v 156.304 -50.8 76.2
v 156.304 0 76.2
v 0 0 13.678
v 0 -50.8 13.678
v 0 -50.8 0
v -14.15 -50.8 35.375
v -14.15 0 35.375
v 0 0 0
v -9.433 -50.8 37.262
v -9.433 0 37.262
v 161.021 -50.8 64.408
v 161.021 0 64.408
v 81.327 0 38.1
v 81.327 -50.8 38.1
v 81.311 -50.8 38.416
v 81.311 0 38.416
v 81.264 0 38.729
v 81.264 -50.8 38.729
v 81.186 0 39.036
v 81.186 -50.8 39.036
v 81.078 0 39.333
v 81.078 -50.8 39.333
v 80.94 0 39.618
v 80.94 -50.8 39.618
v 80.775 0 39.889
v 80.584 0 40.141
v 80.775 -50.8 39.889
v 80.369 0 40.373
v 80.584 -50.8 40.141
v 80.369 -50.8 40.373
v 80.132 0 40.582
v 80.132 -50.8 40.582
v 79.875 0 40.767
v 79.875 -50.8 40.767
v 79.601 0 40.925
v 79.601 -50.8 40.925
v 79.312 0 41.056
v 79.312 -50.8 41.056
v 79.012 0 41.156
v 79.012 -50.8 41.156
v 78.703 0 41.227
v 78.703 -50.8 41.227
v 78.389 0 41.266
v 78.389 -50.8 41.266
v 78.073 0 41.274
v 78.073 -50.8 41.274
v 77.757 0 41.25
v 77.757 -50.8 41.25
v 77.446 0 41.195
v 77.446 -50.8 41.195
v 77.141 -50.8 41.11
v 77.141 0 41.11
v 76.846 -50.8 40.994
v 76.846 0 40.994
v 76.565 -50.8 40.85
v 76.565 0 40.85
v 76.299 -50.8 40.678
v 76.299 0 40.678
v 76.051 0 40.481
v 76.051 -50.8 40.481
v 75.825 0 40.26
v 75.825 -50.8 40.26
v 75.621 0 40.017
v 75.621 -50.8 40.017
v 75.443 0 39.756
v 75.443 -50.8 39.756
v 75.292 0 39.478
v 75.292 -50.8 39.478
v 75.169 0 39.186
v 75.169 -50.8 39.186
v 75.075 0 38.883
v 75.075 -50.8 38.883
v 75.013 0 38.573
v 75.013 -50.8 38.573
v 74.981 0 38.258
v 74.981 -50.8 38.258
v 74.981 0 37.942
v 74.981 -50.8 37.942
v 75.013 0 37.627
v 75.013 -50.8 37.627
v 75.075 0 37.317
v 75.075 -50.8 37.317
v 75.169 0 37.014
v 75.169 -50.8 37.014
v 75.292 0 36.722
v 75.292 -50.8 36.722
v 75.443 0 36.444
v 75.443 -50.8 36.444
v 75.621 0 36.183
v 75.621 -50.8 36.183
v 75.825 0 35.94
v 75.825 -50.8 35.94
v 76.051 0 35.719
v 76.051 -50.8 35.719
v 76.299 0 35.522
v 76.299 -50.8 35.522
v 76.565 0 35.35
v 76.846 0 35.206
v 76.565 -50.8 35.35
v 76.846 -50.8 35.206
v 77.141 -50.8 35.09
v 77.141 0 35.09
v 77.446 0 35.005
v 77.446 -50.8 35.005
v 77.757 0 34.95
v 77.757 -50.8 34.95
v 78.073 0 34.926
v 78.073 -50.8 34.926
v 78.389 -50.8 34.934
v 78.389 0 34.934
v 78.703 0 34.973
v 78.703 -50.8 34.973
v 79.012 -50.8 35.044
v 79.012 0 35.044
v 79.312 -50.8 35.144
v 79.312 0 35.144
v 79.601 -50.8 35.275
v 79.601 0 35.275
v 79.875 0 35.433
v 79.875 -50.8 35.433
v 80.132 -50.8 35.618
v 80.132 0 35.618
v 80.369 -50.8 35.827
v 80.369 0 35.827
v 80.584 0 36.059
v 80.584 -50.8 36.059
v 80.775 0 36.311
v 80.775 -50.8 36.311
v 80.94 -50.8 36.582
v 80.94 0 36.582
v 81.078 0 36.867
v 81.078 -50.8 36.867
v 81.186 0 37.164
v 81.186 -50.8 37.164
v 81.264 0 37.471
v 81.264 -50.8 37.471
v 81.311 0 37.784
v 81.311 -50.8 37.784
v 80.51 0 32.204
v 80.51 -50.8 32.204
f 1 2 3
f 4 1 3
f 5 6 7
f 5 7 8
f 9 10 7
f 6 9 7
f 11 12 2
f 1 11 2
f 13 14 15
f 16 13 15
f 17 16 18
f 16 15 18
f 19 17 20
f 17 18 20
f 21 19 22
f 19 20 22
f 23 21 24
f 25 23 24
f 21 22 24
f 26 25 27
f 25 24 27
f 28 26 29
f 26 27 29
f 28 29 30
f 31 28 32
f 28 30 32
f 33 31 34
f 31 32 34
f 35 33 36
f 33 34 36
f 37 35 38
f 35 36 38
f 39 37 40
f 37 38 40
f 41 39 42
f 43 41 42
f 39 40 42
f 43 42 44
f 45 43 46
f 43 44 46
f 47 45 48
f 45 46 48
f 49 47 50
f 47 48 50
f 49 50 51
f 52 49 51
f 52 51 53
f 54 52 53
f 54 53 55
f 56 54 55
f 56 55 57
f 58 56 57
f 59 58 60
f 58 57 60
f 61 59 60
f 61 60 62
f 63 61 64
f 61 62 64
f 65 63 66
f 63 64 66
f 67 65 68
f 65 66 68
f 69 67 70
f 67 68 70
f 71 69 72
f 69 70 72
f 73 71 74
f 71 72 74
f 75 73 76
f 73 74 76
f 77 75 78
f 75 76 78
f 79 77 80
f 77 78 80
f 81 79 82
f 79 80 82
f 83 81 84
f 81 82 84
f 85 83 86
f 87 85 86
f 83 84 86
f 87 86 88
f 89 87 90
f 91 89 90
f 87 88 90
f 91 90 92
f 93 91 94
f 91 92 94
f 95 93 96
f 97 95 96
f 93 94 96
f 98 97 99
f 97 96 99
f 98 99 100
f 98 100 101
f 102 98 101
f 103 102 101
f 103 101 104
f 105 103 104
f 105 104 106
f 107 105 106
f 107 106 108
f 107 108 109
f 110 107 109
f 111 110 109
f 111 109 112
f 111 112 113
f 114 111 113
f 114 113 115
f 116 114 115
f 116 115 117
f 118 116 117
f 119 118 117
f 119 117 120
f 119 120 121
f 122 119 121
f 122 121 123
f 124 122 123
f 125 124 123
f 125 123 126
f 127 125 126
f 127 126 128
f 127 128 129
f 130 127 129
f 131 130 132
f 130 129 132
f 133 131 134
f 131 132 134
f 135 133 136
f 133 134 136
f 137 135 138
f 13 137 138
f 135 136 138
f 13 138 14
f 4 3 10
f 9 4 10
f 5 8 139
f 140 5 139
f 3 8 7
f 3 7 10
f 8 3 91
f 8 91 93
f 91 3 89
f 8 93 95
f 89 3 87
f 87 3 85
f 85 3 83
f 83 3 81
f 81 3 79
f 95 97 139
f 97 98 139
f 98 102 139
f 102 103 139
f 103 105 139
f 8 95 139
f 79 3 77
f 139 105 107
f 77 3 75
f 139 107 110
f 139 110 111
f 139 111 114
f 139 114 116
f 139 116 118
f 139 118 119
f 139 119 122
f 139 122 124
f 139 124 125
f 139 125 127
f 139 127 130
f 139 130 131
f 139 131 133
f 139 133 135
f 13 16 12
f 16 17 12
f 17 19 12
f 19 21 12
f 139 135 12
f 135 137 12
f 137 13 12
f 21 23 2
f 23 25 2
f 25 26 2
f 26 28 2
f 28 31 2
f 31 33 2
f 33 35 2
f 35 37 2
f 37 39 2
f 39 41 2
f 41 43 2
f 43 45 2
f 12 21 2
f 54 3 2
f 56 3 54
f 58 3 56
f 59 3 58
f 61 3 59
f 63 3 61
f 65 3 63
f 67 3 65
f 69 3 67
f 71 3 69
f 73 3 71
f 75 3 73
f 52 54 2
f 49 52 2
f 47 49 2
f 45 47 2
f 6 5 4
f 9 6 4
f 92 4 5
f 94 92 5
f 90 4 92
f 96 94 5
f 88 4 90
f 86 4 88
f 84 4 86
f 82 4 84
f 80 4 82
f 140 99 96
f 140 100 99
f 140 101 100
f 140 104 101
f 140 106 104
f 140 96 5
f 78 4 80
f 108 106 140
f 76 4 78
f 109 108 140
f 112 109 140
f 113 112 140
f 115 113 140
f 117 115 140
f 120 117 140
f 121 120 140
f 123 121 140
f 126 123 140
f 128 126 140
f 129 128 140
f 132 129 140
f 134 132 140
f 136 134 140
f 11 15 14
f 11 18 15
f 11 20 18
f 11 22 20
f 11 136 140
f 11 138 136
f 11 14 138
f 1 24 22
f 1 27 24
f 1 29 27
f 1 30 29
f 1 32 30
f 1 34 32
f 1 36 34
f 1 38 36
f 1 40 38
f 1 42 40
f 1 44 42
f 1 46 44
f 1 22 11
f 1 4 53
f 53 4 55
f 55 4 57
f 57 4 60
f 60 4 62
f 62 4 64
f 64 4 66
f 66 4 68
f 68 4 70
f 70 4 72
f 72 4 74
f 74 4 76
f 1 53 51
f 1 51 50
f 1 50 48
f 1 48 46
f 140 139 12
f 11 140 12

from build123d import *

# Parameters (mm, degrees)
F1_DEPTH = 50.8
F3_DEPTH = 50.8
F4_R     = 3.175
F5_DEPTH = 50.8


with BuildPart() as f1:
    # F0 (on Front) → F1 (new body)
    with BuildSketch(Plane.XZ):
        Polygon((104.640433, 0), (80.510433, 32.204173), (56.380433, 0), (61.460433, 0), (80.510433, 25.424347), (99.560433, 0), align=None)
        Polygon((-14.149985, 35.374962), (0, 0), (80.510433, 32.204173), (161.020865, 64.408346), (156.304203, 76.2), (0, 13.678319), (-9.433323, 37.261627), align=None)
    extrude(amount=F1_DEPTH)

    # F2 (on face) → F3 (cut)
    with BuildSketch(Plane.XZ.offset(50.8)):
        Polygon((117.38383, 0), (80.510433, 32.204173), (41.978721, -5.036601), align=None)
    extrude(amount=-F3_DEPTH, mode=Mode.SUBTRACT)

    # F4 (on face) → F5 (cut)
    with BuildSketch(Plane.XZ.offset(50.8)):
        with Locations((78.152102, 38.1)):
            Circle(F4_R)
    extrude(amount=-F5_DEPTH, mode=Mode.SUBTRACT)


solid = f1.part
